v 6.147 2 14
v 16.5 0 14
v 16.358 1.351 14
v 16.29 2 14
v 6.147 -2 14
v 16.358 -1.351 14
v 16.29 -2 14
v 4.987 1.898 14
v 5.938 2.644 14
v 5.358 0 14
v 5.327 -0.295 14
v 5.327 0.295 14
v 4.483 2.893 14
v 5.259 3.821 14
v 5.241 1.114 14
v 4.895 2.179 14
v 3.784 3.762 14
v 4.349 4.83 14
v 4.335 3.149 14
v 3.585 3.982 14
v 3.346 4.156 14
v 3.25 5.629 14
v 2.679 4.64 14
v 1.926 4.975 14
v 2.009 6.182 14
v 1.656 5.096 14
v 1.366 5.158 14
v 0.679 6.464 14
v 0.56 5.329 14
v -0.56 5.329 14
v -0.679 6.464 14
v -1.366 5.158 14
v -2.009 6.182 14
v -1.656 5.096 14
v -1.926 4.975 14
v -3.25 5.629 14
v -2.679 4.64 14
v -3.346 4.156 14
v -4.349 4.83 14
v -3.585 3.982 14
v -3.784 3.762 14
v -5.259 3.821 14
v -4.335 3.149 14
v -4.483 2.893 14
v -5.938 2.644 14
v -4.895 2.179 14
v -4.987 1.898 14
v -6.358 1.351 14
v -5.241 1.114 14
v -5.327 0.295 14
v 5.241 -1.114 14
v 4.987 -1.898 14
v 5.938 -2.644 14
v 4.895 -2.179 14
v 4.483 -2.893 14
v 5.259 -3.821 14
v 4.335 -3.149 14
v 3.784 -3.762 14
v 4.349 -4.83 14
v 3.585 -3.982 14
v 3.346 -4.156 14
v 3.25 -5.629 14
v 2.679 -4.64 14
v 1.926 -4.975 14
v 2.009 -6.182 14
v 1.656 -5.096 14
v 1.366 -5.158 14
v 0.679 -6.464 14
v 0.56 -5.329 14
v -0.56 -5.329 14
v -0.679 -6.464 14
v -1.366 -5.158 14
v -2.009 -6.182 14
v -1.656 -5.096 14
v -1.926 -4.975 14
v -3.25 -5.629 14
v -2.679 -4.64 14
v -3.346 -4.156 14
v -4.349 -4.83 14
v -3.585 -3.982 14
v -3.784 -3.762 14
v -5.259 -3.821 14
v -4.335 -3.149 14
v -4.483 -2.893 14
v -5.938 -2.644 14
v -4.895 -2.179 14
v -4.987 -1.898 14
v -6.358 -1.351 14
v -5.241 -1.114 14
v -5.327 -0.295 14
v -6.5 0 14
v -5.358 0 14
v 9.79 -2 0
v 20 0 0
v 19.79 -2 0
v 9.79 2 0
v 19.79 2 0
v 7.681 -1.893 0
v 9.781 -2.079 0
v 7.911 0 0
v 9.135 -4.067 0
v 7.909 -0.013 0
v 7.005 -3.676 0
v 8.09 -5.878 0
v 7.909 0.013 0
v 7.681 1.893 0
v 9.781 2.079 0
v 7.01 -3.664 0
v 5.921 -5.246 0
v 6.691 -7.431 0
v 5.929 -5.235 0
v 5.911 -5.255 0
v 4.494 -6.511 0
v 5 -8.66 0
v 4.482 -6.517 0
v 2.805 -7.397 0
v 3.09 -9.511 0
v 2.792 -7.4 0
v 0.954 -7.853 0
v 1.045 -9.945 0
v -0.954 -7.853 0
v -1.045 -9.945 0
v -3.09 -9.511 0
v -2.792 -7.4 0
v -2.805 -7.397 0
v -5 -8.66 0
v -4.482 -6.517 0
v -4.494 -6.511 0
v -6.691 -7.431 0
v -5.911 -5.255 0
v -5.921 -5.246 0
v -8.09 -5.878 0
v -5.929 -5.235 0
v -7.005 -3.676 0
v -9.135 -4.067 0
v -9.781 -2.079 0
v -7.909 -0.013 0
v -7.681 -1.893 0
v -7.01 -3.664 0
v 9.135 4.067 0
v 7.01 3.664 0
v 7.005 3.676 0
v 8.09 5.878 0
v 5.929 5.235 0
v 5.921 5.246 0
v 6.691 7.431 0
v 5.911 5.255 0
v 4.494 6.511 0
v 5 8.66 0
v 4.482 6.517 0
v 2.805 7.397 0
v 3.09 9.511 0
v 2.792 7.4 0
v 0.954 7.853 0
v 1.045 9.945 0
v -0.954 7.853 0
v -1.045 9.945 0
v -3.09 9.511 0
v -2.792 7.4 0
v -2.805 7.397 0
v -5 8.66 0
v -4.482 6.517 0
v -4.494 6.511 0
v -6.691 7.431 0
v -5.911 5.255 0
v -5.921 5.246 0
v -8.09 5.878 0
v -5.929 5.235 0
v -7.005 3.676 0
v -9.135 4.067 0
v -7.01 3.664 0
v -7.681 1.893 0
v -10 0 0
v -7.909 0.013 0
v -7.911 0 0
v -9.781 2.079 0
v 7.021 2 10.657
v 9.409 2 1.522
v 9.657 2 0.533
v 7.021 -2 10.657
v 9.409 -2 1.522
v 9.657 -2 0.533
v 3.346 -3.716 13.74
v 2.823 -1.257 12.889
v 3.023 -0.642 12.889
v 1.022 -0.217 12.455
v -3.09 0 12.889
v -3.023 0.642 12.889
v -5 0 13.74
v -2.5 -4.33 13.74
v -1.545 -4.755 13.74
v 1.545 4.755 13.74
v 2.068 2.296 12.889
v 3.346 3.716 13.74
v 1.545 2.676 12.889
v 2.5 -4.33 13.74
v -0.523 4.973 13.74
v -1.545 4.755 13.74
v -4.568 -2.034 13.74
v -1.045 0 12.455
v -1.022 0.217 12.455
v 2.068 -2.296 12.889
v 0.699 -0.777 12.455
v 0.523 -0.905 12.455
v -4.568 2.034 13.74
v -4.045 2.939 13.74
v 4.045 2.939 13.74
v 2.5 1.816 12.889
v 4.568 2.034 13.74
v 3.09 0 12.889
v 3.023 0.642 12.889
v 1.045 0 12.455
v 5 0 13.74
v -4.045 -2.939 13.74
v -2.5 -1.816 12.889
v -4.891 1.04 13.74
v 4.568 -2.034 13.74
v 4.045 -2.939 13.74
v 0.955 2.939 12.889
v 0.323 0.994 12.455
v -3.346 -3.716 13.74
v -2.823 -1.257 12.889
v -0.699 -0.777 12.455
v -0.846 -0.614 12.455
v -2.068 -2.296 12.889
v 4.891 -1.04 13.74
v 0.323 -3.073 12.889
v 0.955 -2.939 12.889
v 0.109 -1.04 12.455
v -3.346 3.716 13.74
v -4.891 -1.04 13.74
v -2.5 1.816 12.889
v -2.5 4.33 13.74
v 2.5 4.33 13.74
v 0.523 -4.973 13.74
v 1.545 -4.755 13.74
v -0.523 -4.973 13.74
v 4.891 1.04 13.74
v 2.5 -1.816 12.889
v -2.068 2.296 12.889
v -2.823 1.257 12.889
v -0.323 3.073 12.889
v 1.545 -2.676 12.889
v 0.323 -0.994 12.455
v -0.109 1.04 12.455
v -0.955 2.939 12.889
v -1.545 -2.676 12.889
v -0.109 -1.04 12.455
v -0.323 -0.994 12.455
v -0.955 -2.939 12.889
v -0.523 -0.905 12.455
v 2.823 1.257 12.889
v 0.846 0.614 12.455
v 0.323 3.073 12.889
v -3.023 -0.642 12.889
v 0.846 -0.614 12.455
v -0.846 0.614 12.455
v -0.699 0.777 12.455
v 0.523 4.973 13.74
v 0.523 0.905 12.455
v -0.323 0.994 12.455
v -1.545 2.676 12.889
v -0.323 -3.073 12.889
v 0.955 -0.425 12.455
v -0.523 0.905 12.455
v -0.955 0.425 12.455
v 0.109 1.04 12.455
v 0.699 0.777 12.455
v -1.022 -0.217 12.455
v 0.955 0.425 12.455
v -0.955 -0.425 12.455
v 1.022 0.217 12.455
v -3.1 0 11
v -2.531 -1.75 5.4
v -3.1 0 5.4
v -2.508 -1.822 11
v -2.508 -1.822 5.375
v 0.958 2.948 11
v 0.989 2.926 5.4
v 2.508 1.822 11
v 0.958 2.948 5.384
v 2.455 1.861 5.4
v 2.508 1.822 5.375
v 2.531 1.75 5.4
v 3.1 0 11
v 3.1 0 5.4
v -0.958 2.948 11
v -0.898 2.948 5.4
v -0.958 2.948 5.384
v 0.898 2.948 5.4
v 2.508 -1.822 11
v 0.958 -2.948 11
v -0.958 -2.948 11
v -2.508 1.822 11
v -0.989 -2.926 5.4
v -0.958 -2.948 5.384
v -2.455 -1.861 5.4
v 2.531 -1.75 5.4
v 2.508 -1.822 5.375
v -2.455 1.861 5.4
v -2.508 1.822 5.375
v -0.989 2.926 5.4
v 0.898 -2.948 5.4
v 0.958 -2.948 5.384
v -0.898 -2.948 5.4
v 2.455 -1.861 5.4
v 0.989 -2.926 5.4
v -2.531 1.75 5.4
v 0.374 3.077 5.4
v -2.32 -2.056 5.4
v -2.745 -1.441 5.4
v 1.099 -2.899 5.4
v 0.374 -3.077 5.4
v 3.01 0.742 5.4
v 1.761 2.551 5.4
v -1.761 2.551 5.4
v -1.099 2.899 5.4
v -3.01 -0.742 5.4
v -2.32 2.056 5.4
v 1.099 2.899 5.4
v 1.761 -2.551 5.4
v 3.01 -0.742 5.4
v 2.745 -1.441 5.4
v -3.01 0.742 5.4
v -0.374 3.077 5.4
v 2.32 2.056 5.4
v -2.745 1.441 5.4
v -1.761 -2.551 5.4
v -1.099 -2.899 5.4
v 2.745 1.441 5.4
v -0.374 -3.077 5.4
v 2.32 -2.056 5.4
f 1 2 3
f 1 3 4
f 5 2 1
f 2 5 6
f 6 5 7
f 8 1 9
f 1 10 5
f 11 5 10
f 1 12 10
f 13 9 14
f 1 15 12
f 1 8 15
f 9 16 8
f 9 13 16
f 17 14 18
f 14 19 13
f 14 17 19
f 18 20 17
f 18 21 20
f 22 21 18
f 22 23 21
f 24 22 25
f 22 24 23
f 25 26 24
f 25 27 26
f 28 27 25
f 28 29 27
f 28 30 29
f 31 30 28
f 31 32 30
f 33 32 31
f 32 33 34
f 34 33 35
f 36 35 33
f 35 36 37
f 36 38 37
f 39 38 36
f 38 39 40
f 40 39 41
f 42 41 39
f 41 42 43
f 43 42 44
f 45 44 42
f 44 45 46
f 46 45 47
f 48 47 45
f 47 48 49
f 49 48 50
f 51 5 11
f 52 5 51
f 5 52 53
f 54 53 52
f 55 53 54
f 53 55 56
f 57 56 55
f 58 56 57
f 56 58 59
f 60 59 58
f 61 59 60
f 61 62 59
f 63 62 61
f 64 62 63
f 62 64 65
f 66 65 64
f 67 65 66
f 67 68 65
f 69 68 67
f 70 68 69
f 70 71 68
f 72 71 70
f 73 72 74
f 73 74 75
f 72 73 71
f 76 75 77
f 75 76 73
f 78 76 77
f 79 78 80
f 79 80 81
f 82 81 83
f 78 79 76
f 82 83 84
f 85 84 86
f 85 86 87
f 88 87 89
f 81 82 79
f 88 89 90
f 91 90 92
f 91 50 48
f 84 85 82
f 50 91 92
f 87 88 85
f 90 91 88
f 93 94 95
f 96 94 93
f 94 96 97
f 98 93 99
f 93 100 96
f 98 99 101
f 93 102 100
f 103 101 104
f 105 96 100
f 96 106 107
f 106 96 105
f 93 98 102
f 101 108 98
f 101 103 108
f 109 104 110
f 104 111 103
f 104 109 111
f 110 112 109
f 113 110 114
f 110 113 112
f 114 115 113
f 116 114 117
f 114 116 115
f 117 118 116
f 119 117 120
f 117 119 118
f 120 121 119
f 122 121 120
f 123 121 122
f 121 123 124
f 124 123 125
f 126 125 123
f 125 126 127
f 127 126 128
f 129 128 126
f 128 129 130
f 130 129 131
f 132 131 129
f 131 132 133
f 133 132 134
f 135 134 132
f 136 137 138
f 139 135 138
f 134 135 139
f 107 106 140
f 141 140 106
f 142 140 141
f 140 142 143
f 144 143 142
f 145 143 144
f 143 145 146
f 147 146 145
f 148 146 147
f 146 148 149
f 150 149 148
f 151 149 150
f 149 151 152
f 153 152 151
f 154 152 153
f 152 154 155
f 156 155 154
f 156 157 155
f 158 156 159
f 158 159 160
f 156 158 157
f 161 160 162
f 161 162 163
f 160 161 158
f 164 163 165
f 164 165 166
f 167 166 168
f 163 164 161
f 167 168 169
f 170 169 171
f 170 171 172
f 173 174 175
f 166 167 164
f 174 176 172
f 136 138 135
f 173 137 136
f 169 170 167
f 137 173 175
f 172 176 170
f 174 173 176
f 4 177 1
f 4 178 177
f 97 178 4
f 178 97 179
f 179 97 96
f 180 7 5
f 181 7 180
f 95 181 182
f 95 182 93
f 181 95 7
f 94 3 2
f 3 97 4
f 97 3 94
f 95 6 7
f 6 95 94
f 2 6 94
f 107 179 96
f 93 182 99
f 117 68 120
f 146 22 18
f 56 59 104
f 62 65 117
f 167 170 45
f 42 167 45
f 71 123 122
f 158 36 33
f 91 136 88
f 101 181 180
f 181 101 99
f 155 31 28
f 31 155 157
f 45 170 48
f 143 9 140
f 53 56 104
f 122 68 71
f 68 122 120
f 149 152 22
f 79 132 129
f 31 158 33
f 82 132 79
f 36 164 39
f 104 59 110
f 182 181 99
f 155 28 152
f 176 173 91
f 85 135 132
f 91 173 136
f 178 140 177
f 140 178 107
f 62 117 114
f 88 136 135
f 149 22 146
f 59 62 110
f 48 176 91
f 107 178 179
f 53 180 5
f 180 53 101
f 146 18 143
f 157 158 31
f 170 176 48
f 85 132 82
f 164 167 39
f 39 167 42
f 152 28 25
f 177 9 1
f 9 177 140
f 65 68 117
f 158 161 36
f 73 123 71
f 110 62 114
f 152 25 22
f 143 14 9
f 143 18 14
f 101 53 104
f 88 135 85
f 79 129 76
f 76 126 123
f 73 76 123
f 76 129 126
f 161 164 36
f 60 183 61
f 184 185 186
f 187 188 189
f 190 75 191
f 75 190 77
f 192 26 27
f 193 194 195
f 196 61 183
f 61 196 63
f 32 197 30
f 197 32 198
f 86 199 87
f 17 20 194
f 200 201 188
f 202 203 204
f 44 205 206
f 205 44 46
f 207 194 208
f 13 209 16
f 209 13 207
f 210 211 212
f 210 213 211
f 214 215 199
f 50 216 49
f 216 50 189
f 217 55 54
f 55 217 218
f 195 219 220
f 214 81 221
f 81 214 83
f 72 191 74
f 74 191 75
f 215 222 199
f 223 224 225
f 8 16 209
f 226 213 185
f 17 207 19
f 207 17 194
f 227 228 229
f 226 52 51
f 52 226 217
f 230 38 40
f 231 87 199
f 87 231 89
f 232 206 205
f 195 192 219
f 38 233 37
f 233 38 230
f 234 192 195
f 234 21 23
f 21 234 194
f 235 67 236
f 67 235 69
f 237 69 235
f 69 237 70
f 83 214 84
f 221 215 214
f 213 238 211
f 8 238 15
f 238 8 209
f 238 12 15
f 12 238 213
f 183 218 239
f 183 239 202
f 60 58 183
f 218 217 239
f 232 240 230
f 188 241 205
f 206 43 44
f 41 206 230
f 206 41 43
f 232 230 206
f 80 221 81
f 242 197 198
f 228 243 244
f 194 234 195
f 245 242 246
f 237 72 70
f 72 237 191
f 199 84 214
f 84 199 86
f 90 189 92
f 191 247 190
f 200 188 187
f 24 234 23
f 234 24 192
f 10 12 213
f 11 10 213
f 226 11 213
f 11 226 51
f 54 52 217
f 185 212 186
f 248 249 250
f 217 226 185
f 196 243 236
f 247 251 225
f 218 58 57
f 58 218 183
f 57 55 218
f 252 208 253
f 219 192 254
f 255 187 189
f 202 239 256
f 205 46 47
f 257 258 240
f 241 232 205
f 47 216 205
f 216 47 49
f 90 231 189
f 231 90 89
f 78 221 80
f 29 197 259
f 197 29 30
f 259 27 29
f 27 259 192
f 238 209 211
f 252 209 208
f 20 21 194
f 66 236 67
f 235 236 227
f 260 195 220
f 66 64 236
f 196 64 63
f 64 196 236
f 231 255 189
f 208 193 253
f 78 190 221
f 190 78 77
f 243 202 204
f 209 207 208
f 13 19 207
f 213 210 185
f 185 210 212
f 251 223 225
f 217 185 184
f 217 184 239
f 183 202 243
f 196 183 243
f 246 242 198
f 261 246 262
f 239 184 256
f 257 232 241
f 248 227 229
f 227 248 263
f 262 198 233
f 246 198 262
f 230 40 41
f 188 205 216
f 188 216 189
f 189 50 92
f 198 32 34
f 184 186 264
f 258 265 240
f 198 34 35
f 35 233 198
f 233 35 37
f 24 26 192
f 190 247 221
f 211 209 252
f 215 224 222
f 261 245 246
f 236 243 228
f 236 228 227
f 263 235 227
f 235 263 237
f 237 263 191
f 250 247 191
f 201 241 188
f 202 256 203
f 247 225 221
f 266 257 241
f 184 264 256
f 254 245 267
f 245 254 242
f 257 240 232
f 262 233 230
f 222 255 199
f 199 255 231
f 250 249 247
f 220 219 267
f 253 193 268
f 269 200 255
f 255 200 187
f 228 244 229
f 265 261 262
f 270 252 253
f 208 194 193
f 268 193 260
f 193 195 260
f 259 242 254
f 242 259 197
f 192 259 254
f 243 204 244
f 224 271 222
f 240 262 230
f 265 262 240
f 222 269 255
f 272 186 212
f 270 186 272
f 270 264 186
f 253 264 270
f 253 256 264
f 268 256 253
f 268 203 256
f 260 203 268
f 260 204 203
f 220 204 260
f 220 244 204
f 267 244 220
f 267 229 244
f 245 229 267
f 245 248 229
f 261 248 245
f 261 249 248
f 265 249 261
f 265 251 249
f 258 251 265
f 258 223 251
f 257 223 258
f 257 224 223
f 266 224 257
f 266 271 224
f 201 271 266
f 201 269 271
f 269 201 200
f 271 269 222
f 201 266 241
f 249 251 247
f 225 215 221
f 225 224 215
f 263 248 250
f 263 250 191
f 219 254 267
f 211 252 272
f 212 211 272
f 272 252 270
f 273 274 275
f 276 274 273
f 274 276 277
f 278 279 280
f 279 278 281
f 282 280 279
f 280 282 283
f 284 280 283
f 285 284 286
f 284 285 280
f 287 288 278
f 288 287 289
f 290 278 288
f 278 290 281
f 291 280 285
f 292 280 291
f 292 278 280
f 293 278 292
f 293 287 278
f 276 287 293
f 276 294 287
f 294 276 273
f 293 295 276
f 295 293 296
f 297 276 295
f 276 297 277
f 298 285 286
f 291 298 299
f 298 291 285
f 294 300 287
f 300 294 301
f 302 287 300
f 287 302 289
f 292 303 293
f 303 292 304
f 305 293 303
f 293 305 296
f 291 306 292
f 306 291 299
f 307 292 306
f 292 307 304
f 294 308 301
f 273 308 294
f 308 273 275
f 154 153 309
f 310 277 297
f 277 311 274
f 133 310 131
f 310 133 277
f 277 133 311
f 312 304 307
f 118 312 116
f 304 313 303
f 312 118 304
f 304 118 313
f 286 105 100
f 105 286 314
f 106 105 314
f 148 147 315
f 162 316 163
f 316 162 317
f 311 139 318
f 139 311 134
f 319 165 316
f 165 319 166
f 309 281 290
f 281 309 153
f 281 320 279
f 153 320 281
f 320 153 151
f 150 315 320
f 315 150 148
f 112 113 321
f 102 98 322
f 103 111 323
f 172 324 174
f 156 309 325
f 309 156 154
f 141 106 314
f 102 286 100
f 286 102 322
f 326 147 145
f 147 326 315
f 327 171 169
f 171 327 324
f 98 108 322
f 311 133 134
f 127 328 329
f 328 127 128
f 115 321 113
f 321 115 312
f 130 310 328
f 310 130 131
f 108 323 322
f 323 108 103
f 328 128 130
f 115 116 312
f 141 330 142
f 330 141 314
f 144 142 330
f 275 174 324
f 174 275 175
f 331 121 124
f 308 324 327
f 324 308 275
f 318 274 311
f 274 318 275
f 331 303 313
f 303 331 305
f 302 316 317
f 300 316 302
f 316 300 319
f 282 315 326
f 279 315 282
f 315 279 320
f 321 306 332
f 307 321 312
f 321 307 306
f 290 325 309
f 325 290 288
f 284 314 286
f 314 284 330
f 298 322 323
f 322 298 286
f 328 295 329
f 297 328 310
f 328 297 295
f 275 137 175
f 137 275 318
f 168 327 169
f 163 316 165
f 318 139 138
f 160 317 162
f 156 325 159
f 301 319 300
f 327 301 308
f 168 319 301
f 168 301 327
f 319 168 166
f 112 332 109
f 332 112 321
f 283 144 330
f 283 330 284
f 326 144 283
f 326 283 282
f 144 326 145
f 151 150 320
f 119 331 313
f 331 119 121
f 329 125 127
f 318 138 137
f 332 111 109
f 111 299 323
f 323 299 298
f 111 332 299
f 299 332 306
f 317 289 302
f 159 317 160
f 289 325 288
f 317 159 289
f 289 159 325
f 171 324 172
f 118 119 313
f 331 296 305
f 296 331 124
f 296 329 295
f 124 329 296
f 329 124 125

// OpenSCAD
post_diameter_tolerance = 0.2;
post_diameter = 6 + post_diameter_tolerance;
post_height = 11; 

knob_height = 14;
knob_bottom_r = 10;
knob_top_r = 6.5;
knob_wing_w = 4;

full_part();

module full_part() {
    difference() {
        union() {
            knob();
            wing();
        }
        
        union() {
            dimple();
            mount();
            hollow();
        }
    }
}

module knob() {
    cylinder(h=knob_height, r1 = knob_bottom_r, r2 = knob_top_r);
}

module dimple() {
    translate([0, 0, knob_height*1.6])
        sphere(r=knob_bottom_r);
}

module wing() {
    intersection() {
        translate([0, -knob_wing_w / 2, 0]) {
            cube([4 * knob_top_r, knob_wing_w, knob_height]);
        }
        
        scale([2, 2, 2]) {
            knob();
        }
    }
}

module mount() {
    cylinder(h = post_height, r = post_diameter / 2);
}

module hollow() {
    translate([0, 0, -0.1]) {
        cylinder(h = post_height / 2, r1 = knob_bottom_r - 2, r2 = post_diameter/2);
    }
}
